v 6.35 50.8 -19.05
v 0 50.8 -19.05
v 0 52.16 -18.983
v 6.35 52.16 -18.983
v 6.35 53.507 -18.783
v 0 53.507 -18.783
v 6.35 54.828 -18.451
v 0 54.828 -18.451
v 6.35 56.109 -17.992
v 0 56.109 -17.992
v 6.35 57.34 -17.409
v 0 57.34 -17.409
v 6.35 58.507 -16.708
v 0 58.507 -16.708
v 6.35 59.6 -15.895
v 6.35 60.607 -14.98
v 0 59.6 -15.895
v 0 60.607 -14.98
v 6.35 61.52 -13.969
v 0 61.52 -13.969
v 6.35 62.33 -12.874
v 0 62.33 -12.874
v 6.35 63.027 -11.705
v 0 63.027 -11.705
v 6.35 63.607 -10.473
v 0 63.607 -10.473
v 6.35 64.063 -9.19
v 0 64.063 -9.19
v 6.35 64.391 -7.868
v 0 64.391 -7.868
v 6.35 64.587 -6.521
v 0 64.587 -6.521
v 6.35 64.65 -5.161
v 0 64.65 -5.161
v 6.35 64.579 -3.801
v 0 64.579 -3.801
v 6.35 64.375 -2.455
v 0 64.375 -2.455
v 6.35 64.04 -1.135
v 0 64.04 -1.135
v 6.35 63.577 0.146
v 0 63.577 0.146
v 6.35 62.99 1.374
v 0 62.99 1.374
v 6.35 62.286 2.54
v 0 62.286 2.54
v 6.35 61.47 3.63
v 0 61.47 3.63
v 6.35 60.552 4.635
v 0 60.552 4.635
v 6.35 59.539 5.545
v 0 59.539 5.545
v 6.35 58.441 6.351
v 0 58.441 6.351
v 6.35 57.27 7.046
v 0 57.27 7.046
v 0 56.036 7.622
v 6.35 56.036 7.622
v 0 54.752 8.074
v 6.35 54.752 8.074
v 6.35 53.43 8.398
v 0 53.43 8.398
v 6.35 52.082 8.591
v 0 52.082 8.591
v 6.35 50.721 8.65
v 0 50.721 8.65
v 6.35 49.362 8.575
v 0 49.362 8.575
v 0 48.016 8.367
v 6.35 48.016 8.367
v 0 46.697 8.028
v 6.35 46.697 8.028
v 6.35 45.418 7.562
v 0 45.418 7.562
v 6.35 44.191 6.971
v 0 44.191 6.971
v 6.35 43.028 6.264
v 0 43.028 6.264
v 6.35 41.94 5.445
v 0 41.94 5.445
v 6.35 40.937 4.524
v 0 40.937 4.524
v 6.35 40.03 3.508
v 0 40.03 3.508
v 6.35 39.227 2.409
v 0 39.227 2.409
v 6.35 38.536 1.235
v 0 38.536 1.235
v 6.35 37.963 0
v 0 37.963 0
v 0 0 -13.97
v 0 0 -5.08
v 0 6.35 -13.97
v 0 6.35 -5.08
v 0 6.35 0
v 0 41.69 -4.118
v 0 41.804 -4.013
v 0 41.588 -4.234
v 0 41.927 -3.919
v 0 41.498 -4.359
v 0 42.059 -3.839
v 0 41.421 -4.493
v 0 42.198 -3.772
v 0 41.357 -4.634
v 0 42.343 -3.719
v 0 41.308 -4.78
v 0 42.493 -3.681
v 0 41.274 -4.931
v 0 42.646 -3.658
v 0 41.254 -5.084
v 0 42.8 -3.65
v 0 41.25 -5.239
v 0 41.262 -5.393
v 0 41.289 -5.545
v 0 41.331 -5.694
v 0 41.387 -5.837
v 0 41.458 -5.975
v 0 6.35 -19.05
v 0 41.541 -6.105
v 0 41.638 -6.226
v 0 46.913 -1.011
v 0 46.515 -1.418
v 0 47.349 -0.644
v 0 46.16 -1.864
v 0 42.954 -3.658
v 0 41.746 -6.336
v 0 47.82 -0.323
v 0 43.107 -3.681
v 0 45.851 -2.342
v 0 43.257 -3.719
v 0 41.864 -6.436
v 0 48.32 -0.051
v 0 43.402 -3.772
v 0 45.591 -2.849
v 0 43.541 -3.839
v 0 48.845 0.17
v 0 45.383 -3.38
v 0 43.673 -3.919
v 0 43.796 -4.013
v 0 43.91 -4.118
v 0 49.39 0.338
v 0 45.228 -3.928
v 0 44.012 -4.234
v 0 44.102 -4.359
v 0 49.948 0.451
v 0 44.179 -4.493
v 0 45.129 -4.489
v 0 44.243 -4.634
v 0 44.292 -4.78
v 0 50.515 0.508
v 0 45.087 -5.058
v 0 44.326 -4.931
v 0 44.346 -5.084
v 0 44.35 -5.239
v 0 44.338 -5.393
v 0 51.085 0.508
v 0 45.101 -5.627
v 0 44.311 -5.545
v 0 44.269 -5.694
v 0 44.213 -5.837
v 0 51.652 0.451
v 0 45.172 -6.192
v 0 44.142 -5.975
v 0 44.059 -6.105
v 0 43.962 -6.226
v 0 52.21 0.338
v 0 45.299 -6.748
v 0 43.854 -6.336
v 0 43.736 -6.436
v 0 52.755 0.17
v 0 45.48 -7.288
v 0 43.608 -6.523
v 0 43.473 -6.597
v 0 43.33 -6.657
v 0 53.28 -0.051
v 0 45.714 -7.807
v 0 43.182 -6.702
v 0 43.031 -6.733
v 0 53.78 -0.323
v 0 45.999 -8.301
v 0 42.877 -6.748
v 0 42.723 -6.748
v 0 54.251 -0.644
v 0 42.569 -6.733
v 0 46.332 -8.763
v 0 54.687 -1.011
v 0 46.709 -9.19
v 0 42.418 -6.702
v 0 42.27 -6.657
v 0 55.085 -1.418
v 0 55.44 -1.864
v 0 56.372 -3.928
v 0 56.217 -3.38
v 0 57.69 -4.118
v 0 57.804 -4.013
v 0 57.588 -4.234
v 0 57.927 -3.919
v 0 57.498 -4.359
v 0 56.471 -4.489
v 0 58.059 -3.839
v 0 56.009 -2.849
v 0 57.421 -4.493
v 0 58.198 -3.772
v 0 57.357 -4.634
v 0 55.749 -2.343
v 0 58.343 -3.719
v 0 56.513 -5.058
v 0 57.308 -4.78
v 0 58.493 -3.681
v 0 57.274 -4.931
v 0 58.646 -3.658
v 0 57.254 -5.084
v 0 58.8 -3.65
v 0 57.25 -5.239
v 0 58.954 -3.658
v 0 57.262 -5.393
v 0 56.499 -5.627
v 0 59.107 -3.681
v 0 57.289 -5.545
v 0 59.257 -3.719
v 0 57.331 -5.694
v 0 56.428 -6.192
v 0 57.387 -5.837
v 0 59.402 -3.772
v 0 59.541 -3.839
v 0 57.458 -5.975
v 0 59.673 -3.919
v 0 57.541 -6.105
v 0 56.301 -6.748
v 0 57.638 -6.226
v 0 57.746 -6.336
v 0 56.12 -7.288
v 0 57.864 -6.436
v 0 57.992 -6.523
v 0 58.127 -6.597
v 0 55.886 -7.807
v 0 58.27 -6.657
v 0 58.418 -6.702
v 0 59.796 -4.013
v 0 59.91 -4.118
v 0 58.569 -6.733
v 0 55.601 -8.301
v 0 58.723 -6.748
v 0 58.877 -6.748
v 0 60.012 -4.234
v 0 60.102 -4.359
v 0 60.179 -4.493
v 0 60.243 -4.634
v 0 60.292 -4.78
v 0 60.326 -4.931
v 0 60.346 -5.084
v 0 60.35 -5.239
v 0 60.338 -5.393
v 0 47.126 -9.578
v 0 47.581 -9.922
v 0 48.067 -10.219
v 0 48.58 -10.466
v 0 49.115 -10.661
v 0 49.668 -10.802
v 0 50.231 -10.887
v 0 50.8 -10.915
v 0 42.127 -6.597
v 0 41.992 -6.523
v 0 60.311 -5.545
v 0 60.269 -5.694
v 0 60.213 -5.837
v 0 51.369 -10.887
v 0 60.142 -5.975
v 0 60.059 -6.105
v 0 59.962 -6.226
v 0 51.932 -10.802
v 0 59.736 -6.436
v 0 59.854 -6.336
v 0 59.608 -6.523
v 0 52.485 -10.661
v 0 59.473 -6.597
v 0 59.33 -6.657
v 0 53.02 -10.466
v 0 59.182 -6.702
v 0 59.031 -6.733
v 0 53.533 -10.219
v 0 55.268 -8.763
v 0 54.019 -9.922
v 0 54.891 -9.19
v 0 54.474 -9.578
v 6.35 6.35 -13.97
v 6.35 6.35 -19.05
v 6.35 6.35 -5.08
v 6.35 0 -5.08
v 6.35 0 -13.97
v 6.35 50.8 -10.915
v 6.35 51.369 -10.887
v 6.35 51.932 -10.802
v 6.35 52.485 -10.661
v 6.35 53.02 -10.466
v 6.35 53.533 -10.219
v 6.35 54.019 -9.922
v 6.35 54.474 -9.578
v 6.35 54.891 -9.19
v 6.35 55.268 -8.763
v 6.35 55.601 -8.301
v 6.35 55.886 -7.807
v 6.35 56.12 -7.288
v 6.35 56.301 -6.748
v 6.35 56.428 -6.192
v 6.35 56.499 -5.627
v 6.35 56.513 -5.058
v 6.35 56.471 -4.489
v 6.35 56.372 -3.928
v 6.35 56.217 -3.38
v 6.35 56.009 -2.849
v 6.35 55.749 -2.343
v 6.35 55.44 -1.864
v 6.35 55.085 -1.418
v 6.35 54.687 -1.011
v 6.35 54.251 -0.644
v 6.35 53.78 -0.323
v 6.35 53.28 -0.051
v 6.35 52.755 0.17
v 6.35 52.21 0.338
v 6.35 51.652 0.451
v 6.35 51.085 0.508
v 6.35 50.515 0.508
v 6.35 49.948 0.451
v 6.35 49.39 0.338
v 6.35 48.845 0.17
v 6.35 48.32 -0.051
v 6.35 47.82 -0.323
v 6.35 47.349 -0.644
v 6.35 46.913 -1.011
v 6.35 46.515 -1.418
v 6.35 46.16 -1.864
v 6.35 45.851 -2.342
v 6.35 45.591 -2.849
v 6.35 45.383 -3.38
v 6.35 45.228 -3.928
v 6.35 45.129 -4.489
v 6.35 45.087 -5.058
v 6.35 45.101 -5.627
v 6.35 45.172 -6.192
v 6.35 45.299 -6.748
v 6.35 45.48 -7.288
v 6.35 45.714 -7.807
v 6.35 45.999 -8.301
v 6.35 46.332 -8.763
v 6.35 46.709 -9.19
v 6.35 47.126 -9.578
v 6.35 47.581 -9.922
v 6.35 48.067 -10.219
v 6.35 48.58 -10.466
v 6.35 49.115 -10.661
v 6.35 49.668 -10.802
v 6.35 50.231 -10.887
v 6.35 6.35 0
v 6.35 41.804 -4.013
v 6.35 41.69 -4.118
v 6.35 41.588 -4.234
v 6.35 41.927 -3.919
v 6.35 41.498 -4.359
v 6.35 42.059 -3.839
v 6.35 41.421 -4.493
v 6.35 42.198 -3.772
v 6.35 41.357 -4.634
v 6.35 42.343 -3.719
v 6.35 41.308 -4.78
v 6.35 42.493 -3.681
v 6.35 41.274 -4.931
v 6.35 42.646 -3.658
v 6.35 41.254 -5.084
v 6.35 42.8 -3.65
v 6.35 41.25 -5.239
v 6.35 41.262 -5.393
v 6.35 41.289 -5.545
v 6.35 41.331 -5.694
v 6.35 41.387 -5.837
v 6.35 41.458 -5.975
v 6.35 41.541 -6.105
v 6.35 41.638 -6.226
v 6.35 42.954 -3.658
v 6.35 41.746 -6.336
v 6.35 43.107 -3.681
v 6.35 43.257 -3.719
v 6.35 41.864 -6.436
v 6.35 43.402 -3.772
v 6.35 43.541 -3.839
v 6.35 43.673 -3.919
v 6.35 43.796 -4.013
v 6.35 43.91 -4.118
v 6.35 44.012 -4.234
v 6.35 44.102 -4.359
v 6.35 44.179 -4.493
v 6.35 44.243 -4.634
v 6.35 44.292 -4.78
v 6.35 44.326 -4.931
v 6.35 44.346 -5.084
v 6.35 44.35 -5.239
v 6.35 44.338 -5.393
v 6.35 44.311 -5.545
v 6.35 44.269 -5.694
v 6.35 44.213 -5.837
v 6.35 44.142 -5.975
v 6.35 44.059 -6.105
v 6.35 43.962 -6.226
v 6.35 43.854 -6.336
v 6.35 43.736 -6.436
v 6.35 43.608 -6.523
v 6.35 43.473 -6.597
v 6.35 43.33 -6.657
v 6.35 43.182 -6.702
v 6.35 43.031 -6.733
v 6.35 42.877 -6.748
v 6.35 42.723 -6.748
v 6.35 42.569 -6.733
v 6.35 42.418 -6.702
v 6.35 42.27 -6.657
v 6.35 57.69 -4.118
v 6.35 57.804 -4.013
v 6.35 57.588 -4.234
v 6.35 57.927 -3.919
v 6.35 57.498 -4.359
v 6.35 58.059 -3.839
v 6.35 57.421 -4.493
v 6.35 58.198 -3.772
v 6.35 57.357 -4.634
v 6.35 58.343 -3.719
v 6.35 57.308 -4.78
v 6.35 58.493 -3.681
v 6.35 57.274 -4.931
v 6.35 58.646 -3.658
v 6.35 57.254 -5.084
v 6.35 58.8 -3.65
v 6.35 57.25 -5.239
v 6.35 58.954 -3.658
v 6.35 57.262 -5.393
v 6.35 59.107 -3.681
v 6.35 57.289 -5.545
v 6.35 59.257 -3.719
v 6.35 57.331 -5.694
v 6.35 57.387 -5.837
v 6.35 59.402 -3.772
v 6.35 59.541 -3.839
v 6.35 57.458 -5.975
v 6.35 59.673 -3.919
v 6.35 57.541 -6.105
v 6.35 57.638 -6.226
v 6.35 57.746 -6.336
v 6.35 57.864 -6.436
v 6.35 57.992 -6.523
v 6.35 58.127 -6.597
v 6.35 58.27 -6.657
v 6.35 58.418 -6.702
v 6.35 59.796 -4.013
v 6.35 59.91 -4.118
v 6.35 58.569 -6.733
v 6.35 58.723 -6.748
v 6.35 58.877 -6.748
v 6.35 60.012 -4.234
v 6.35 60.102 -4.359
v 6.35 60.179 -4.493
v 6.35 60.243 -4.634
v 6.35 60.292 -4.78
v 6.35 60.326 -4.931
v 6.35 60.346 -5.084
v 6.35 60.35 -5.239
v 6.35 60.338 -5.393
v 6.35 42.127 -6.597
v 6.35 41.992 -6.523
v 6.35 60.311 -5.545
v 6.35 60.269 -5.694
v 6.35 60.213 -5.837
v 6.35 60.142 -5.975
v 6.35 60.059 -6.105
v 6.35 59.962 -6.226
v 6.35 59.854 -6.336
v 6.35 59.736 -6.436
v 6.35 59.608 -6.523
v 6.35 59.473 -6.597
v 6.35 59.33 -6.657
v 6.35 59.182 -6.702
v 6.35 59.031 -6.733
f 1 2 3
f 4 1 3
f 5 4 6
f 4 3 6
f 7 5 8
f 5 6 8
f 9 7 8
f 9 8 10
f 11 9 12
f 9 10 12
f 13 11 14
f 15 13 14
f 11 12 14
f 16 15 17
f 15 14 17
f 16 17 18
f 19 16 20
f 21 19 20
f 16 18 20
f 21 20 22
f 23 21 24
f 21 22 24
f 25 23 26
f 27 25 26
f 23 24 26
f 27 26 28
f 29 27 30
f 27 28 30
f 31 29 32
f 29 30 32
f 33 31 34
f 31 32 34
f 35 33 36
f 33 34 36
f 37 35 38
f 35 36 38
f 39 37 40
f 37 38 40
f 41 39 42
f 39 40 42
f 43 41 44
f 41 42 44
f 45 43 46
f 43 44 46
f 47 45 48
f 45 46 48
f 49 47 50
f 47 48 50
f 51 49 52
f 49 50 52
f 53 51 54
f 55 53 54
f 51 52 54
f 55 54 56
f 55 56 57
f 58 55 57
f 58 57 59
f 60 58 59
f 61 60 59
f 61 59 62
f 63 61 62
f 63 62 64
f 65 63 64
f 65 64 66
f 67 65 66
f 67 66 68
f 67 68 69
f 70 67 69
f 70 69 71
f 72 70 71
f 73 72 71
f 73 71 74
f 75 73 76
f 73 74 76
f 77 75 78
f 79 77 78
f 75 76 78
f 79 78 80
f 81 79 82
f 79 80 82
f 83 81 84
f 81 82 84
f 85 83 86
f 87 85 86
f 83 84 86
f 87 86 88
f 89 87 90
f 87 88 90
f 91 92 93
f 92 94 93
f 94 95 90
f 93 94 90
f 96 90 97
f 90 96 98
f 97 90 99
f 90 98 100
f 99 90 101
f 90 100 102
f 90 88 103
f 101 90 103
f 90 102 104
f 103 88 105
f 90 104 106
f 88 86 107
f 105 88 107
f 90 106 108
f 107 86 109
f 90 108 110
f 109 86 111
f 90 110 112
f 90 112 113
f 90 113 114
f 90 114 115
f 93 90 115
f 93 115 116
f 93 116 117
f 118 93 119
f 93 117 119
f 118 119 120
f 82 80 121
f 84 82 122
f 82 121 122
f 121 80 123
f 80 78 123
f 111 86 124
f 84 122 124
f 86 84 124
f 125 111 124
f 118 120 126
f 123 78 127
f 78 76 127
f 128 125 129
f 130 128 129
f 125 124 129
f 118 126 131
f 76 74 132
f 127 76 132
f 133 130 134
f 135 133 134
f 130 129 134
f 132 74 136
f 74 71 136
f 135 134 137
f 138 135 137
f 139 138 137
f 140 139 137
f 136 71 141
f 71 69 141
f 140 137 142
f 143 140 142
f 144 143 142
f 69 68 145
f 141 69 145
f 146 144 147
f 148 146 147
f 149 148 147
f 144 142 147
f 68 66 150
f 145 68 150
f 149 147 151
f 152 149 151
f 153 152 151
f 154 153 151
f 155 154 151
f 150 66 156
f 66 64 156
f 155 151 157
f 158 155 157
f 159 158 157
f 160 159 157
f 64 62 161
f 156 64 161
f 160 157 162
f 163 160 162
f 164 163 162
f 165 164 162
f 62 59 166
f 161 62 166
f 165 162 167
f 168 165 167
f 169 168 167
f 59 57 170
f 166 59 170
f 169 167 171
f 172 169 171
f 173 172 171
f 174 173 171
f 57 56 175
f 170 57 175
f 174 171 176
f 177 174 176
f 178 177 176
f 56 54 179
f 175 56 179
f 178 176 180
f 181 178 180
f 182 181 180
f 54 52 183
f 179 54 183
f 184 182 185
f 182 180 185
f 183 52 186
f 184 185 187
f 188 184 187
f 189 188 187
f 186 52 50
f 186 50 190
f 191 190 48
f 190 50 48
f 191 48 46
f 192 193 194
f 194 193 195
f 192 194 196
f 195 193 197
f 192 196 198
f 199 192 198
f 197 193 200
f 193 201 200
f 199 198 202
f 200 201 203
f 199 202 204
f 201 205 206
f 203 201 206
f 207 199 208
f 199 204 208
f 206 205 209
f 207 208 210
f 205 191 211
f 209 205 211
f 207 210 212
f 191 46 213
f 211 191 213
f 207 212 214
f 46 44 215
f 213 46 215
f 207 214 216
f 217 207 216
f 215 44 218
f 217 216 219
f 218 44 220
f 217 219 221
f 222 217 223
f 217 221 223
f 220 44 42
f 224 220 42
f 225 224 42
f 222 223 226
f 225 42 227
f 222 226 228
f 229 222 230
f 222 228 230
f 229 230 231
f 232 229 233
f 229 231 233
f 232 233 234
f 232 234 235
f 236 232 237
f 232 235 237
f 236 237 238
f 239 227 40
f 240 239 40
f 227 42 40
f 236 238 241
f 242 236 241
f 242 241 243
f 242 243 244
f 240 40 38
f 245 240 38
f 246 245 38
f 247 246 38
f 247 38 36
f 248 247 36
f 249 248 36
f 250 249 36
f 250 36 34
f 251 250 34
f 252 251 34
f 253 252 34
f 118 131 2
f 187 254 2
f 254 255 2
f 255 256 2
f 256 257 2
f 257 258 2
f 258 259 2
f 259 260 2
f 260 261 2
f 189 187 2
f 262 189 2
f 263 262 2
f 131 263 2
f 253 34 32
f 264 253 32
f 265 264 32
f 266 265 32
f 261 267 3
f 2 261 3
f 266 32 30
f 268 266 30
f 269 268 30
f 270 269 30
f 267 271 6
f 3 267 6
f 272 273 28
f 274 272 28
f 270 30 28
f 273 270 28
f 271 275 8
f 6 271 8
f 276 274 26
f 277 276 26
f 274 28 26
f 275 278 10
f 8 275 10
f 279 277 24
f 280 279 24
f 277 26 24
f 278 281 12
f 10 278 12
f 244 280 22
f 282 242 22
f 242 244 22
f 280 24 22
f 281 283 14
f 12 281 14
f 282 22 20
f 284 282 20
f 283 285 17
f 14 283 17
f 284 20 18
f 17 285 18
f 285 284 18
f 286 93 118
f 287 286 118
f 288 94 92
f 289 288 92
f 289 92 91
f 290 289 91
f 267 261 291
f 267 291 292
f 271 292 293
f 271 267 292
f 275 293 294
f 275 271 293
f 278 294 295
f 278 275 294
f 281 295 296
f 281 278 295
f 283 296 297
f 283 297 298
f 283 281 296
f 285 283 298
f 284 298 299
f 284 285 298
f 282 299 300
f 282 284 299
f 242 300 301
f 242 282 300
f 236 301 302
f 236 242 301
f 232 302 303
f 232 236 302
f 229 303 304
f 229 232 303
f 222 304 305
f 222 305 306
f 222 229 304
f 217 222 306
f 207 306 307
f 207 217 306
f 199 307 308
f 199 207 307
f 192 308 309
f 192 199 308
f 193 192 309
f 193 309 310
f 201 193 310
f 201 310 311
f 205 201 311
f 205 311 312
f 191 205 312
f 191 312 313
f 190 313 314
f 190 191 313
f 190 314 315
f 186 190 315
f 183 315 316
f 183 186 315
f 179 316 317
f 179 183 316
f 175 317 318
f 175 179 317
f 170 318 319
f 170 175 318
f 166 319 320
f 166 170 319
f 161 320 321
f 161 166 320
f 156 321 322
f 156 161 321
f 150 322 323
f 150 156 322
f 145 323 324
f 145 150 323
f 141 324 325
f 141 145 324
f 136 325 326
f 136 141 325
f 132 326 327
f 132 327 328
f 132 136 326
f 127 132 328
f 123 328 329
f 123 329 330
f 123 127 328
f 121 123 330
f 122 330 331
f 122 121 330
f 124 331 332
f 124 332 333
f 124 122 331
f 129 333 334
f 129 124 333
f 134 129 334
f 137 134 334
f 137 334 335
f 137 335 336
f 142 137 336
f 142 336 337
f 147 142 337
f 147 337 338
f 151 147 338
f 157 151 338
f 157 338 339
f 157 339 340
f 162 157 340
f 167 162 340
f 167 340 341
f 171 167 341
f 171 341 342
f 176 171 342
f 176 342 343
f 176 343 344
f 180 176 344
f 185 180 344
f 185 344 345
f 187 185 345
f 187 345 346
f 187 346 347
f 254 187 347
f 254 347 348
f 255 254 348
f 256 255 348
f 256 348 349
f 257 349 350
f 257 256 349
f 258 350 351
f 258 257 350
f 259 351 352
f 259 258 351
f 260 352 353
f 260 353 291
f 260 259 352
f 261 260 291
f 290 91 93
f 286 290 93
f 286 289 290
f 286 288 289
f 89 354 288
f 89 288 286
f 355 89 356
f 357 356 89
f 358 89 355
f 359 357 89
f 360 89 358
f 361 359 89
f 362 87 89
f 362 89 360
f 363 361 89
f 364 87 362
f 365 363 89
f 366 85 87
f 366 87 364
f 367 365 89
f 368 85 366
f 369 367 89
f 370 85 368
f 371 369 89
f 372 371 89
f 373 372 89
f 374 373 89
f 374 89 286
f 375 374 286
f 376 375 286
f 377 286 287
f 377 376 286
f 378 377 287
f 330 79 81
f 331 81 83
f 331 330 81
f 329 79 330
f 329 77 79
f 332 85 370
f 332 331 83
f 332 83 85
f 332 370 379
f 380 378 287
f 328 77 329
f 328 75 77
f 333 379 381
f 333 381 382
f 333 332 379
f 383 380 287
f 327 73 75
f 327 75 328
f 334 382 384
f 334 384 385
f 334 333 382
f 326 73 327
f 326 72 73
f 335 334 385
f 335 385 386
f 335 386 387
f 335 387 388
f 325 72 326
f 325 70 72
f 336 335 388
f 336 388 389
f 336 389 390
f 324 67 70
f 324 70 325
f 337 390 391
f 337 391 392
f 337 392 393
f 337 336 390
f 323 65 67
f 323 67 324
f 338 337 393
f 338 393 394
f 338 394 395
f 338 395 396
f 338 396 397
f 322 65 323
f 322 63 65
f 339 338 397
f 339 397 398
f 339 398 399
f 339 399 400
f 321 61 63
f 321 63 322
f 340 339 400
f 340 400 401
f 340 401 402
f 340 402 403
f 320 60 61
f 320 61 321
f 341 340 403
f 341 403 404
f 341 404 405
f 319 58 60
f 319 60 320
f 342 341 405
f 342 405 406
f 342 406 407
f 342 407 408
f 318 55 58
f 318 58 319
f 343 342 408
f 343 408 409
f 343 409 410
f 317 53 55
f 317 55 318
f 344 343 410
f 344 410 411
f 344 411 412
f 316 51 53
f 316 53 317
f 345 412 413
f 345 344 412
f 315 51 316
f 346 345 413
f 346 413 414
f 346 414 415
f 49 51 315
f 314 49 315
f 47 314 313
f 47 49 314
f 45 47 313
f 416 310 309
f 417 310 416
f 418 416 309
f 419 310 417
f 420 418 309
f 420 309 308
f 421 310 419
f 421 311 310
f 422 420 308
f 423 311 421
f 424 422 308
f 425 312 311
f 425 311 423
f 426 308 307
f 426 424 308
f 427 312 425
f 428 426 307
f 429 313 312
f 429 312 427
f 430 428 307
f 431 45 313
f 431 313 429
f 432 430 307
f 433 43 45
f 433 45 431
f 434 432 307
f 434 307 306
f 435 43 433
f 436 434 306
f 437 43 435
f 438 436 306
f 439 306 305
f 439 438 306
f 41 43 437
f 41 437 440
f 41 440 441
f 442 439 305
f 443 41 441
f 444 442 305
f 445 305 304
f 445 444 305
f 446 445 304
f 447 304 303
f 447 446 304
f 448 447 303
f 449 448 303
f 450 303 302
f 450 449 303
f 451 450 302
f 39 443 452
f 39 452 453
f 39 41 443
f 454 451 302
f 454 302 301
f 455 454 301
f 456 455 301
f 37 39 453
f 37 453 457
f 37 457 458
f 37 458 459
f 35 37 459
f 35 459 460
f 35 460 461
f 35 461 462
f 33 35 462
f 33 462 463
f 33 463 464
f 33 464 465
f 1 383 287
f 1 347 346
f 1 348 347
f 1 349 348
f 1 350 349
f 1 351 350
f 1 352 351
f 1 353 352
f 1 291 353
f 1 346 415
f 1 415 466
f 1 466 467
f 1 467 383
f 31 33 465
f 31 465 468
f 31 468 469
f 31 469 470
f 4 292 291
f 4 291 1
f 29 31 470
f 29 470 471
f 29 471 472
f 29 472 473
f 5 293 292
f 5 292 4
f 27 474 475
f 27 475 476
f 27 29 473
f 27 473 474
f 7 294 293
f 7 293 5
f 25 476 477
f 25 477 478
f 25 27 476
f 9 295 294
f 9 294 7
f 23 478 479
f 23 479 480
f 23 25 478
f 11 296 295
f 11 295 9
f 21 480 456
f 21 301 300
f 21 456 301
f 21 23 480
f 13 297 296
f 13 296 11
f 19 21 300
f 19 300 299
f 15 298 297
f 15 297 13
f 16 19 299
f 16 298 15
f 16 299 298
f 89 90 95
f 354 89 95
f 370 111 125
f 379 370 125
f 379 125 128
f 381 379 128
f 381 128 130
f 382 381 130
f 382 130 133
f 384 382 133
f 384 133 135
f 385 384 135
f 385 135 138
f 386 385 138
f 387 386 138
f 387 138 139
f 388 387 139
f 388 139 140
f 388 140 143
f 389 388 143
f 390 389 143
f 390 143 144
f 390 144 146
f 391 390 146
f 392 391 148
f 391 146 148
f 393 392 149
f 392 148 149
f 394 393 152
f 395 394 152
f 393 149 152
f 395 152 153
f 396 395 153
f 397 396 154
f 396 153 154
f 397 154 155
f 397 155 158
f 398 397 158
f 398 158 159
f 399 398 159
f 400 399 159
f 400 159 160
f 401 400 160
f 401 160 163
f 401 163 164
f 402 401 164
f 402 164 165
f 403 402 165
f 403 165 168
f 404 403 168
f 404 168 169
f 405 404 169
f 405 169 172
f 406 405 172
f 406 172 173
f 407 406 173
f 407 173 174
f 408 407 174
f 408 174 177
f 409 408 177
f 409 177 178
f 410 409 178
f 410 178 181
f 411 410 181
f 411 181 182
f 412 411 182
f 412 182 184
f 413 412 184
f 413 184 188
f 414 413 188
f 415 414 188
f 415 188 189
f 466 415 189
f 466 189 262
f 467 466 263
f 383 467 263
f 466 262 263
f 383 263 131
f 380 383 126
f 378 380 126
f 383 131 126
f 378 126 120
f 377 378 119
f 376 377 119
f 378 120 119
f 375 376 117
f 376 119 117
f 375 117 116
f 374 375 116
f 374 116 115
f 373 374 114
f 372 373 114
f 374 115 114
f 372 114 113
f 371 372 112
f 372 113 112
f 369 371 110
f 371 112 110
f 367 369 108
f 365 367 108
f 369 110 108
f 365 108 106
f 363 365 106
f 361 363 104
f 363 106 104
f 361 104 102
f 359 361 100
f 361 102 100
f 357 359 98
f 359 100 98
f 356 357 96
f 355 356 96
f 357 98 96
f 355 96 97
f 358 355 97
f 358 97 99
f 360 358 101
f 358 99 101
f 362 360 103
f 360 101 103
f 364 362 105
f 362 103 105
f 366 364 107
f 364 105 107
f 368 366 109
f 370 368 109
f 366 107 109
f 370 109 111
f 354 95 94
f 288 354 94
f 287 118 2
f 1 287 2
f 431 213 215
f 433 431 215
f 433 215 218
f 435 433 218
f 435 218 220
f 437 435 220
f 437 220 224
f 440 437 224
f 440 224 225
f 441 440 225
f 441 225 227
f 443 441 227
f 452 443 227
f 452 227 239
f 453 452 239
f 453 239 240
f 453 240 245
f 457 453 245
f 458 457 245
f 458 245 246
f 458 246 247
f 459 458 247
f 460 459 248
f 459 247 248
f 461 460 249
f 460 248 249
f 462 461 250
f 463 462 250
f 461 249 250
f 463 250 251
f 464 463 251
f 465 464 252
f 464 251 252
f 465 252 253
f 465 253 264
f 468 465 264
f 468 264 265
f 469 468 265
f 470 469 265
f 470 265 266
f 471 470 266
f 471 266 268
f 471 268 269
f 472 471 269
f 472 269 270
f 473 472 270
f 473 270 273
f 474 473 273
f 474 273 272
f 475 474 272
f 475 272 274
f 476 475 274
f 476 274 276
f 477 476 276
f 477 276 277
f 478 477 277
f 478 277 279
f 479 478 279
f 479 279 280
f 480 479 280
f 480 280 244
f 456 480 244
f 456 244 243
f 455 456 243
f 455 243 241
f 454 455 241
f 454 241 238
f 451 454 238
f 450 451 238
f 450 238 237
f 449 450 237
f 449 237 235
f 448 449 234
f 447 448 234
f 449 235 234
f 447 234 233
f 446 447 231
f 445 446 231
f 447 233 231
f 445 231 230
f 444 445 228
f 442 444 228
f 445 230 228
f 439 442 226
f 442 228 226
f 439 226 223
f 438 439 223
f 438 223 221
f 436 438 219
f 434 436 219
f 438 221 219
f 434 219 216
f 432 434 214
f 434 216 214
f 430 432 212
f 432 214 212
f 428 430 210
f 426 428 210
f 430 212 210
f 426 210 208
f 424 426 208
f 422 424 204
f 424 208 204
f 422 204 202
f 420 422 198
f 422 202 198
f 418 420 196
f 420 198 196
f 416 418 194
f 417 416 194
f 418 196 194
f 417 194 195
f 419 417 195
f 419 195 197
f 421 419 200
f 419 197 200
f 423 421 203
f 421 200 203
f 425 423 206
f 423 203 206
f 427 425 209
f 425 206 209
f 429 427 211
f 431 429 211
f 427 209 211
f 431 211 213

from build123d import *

# Parameters (mm, degrees)
SKETCH1_R              = 5.715
BOSS_EXTRUDE1_DEPTH    = 6.35
M2_5_CLEARANCE_HOLE1_D = 3.1


with BuildPart() as part:
    # Sketch1 → Boss-Extrude1 (new body)
    with BuildSketch(Plane(origin=(0, 0, 0), x_dir=(0, 0, -1), z_dir=(1, 0, 0))):
        with BuildLine():
            Line((5.08, 0), (13.97, 0))
            Line((13.97, 0), (13.97, 6.35))
            Line((13.97, 6.35), (19.05, 6.35))
            Line((19.05, 6.35), (19.05, 50.8))
            ThreePointArc((19.05, 50.8), (-2.539589782, 62.285697628), (0, 37.963236389))
            Line((0, 37.963236389), (0, 6.35))
            Line((0, 6.35), (5.08, 6.35))
            Line((5.08, 6.35), (5.08, 0))
        make_face()
        with Locations((5.2, 50.8)):
            Circle(SKETCH1_R, mode=Mode.SUBTRACT)
    extrude(amount=BOSS_EXTRUDE1_DEPTH)

    # M2.5 Clearance Hole1 (through all)
    with Locations(Plane(origin=(6.35, 0, 0), x_dir=(0, 0, -1), z_dir=(1, 0, 0))):
        with Locations((5.2, 58.8), (5.2, 42.8)):
            Hole(M2_5_CLEARANCE_HOLE1_D / 2)


solid = part.part
